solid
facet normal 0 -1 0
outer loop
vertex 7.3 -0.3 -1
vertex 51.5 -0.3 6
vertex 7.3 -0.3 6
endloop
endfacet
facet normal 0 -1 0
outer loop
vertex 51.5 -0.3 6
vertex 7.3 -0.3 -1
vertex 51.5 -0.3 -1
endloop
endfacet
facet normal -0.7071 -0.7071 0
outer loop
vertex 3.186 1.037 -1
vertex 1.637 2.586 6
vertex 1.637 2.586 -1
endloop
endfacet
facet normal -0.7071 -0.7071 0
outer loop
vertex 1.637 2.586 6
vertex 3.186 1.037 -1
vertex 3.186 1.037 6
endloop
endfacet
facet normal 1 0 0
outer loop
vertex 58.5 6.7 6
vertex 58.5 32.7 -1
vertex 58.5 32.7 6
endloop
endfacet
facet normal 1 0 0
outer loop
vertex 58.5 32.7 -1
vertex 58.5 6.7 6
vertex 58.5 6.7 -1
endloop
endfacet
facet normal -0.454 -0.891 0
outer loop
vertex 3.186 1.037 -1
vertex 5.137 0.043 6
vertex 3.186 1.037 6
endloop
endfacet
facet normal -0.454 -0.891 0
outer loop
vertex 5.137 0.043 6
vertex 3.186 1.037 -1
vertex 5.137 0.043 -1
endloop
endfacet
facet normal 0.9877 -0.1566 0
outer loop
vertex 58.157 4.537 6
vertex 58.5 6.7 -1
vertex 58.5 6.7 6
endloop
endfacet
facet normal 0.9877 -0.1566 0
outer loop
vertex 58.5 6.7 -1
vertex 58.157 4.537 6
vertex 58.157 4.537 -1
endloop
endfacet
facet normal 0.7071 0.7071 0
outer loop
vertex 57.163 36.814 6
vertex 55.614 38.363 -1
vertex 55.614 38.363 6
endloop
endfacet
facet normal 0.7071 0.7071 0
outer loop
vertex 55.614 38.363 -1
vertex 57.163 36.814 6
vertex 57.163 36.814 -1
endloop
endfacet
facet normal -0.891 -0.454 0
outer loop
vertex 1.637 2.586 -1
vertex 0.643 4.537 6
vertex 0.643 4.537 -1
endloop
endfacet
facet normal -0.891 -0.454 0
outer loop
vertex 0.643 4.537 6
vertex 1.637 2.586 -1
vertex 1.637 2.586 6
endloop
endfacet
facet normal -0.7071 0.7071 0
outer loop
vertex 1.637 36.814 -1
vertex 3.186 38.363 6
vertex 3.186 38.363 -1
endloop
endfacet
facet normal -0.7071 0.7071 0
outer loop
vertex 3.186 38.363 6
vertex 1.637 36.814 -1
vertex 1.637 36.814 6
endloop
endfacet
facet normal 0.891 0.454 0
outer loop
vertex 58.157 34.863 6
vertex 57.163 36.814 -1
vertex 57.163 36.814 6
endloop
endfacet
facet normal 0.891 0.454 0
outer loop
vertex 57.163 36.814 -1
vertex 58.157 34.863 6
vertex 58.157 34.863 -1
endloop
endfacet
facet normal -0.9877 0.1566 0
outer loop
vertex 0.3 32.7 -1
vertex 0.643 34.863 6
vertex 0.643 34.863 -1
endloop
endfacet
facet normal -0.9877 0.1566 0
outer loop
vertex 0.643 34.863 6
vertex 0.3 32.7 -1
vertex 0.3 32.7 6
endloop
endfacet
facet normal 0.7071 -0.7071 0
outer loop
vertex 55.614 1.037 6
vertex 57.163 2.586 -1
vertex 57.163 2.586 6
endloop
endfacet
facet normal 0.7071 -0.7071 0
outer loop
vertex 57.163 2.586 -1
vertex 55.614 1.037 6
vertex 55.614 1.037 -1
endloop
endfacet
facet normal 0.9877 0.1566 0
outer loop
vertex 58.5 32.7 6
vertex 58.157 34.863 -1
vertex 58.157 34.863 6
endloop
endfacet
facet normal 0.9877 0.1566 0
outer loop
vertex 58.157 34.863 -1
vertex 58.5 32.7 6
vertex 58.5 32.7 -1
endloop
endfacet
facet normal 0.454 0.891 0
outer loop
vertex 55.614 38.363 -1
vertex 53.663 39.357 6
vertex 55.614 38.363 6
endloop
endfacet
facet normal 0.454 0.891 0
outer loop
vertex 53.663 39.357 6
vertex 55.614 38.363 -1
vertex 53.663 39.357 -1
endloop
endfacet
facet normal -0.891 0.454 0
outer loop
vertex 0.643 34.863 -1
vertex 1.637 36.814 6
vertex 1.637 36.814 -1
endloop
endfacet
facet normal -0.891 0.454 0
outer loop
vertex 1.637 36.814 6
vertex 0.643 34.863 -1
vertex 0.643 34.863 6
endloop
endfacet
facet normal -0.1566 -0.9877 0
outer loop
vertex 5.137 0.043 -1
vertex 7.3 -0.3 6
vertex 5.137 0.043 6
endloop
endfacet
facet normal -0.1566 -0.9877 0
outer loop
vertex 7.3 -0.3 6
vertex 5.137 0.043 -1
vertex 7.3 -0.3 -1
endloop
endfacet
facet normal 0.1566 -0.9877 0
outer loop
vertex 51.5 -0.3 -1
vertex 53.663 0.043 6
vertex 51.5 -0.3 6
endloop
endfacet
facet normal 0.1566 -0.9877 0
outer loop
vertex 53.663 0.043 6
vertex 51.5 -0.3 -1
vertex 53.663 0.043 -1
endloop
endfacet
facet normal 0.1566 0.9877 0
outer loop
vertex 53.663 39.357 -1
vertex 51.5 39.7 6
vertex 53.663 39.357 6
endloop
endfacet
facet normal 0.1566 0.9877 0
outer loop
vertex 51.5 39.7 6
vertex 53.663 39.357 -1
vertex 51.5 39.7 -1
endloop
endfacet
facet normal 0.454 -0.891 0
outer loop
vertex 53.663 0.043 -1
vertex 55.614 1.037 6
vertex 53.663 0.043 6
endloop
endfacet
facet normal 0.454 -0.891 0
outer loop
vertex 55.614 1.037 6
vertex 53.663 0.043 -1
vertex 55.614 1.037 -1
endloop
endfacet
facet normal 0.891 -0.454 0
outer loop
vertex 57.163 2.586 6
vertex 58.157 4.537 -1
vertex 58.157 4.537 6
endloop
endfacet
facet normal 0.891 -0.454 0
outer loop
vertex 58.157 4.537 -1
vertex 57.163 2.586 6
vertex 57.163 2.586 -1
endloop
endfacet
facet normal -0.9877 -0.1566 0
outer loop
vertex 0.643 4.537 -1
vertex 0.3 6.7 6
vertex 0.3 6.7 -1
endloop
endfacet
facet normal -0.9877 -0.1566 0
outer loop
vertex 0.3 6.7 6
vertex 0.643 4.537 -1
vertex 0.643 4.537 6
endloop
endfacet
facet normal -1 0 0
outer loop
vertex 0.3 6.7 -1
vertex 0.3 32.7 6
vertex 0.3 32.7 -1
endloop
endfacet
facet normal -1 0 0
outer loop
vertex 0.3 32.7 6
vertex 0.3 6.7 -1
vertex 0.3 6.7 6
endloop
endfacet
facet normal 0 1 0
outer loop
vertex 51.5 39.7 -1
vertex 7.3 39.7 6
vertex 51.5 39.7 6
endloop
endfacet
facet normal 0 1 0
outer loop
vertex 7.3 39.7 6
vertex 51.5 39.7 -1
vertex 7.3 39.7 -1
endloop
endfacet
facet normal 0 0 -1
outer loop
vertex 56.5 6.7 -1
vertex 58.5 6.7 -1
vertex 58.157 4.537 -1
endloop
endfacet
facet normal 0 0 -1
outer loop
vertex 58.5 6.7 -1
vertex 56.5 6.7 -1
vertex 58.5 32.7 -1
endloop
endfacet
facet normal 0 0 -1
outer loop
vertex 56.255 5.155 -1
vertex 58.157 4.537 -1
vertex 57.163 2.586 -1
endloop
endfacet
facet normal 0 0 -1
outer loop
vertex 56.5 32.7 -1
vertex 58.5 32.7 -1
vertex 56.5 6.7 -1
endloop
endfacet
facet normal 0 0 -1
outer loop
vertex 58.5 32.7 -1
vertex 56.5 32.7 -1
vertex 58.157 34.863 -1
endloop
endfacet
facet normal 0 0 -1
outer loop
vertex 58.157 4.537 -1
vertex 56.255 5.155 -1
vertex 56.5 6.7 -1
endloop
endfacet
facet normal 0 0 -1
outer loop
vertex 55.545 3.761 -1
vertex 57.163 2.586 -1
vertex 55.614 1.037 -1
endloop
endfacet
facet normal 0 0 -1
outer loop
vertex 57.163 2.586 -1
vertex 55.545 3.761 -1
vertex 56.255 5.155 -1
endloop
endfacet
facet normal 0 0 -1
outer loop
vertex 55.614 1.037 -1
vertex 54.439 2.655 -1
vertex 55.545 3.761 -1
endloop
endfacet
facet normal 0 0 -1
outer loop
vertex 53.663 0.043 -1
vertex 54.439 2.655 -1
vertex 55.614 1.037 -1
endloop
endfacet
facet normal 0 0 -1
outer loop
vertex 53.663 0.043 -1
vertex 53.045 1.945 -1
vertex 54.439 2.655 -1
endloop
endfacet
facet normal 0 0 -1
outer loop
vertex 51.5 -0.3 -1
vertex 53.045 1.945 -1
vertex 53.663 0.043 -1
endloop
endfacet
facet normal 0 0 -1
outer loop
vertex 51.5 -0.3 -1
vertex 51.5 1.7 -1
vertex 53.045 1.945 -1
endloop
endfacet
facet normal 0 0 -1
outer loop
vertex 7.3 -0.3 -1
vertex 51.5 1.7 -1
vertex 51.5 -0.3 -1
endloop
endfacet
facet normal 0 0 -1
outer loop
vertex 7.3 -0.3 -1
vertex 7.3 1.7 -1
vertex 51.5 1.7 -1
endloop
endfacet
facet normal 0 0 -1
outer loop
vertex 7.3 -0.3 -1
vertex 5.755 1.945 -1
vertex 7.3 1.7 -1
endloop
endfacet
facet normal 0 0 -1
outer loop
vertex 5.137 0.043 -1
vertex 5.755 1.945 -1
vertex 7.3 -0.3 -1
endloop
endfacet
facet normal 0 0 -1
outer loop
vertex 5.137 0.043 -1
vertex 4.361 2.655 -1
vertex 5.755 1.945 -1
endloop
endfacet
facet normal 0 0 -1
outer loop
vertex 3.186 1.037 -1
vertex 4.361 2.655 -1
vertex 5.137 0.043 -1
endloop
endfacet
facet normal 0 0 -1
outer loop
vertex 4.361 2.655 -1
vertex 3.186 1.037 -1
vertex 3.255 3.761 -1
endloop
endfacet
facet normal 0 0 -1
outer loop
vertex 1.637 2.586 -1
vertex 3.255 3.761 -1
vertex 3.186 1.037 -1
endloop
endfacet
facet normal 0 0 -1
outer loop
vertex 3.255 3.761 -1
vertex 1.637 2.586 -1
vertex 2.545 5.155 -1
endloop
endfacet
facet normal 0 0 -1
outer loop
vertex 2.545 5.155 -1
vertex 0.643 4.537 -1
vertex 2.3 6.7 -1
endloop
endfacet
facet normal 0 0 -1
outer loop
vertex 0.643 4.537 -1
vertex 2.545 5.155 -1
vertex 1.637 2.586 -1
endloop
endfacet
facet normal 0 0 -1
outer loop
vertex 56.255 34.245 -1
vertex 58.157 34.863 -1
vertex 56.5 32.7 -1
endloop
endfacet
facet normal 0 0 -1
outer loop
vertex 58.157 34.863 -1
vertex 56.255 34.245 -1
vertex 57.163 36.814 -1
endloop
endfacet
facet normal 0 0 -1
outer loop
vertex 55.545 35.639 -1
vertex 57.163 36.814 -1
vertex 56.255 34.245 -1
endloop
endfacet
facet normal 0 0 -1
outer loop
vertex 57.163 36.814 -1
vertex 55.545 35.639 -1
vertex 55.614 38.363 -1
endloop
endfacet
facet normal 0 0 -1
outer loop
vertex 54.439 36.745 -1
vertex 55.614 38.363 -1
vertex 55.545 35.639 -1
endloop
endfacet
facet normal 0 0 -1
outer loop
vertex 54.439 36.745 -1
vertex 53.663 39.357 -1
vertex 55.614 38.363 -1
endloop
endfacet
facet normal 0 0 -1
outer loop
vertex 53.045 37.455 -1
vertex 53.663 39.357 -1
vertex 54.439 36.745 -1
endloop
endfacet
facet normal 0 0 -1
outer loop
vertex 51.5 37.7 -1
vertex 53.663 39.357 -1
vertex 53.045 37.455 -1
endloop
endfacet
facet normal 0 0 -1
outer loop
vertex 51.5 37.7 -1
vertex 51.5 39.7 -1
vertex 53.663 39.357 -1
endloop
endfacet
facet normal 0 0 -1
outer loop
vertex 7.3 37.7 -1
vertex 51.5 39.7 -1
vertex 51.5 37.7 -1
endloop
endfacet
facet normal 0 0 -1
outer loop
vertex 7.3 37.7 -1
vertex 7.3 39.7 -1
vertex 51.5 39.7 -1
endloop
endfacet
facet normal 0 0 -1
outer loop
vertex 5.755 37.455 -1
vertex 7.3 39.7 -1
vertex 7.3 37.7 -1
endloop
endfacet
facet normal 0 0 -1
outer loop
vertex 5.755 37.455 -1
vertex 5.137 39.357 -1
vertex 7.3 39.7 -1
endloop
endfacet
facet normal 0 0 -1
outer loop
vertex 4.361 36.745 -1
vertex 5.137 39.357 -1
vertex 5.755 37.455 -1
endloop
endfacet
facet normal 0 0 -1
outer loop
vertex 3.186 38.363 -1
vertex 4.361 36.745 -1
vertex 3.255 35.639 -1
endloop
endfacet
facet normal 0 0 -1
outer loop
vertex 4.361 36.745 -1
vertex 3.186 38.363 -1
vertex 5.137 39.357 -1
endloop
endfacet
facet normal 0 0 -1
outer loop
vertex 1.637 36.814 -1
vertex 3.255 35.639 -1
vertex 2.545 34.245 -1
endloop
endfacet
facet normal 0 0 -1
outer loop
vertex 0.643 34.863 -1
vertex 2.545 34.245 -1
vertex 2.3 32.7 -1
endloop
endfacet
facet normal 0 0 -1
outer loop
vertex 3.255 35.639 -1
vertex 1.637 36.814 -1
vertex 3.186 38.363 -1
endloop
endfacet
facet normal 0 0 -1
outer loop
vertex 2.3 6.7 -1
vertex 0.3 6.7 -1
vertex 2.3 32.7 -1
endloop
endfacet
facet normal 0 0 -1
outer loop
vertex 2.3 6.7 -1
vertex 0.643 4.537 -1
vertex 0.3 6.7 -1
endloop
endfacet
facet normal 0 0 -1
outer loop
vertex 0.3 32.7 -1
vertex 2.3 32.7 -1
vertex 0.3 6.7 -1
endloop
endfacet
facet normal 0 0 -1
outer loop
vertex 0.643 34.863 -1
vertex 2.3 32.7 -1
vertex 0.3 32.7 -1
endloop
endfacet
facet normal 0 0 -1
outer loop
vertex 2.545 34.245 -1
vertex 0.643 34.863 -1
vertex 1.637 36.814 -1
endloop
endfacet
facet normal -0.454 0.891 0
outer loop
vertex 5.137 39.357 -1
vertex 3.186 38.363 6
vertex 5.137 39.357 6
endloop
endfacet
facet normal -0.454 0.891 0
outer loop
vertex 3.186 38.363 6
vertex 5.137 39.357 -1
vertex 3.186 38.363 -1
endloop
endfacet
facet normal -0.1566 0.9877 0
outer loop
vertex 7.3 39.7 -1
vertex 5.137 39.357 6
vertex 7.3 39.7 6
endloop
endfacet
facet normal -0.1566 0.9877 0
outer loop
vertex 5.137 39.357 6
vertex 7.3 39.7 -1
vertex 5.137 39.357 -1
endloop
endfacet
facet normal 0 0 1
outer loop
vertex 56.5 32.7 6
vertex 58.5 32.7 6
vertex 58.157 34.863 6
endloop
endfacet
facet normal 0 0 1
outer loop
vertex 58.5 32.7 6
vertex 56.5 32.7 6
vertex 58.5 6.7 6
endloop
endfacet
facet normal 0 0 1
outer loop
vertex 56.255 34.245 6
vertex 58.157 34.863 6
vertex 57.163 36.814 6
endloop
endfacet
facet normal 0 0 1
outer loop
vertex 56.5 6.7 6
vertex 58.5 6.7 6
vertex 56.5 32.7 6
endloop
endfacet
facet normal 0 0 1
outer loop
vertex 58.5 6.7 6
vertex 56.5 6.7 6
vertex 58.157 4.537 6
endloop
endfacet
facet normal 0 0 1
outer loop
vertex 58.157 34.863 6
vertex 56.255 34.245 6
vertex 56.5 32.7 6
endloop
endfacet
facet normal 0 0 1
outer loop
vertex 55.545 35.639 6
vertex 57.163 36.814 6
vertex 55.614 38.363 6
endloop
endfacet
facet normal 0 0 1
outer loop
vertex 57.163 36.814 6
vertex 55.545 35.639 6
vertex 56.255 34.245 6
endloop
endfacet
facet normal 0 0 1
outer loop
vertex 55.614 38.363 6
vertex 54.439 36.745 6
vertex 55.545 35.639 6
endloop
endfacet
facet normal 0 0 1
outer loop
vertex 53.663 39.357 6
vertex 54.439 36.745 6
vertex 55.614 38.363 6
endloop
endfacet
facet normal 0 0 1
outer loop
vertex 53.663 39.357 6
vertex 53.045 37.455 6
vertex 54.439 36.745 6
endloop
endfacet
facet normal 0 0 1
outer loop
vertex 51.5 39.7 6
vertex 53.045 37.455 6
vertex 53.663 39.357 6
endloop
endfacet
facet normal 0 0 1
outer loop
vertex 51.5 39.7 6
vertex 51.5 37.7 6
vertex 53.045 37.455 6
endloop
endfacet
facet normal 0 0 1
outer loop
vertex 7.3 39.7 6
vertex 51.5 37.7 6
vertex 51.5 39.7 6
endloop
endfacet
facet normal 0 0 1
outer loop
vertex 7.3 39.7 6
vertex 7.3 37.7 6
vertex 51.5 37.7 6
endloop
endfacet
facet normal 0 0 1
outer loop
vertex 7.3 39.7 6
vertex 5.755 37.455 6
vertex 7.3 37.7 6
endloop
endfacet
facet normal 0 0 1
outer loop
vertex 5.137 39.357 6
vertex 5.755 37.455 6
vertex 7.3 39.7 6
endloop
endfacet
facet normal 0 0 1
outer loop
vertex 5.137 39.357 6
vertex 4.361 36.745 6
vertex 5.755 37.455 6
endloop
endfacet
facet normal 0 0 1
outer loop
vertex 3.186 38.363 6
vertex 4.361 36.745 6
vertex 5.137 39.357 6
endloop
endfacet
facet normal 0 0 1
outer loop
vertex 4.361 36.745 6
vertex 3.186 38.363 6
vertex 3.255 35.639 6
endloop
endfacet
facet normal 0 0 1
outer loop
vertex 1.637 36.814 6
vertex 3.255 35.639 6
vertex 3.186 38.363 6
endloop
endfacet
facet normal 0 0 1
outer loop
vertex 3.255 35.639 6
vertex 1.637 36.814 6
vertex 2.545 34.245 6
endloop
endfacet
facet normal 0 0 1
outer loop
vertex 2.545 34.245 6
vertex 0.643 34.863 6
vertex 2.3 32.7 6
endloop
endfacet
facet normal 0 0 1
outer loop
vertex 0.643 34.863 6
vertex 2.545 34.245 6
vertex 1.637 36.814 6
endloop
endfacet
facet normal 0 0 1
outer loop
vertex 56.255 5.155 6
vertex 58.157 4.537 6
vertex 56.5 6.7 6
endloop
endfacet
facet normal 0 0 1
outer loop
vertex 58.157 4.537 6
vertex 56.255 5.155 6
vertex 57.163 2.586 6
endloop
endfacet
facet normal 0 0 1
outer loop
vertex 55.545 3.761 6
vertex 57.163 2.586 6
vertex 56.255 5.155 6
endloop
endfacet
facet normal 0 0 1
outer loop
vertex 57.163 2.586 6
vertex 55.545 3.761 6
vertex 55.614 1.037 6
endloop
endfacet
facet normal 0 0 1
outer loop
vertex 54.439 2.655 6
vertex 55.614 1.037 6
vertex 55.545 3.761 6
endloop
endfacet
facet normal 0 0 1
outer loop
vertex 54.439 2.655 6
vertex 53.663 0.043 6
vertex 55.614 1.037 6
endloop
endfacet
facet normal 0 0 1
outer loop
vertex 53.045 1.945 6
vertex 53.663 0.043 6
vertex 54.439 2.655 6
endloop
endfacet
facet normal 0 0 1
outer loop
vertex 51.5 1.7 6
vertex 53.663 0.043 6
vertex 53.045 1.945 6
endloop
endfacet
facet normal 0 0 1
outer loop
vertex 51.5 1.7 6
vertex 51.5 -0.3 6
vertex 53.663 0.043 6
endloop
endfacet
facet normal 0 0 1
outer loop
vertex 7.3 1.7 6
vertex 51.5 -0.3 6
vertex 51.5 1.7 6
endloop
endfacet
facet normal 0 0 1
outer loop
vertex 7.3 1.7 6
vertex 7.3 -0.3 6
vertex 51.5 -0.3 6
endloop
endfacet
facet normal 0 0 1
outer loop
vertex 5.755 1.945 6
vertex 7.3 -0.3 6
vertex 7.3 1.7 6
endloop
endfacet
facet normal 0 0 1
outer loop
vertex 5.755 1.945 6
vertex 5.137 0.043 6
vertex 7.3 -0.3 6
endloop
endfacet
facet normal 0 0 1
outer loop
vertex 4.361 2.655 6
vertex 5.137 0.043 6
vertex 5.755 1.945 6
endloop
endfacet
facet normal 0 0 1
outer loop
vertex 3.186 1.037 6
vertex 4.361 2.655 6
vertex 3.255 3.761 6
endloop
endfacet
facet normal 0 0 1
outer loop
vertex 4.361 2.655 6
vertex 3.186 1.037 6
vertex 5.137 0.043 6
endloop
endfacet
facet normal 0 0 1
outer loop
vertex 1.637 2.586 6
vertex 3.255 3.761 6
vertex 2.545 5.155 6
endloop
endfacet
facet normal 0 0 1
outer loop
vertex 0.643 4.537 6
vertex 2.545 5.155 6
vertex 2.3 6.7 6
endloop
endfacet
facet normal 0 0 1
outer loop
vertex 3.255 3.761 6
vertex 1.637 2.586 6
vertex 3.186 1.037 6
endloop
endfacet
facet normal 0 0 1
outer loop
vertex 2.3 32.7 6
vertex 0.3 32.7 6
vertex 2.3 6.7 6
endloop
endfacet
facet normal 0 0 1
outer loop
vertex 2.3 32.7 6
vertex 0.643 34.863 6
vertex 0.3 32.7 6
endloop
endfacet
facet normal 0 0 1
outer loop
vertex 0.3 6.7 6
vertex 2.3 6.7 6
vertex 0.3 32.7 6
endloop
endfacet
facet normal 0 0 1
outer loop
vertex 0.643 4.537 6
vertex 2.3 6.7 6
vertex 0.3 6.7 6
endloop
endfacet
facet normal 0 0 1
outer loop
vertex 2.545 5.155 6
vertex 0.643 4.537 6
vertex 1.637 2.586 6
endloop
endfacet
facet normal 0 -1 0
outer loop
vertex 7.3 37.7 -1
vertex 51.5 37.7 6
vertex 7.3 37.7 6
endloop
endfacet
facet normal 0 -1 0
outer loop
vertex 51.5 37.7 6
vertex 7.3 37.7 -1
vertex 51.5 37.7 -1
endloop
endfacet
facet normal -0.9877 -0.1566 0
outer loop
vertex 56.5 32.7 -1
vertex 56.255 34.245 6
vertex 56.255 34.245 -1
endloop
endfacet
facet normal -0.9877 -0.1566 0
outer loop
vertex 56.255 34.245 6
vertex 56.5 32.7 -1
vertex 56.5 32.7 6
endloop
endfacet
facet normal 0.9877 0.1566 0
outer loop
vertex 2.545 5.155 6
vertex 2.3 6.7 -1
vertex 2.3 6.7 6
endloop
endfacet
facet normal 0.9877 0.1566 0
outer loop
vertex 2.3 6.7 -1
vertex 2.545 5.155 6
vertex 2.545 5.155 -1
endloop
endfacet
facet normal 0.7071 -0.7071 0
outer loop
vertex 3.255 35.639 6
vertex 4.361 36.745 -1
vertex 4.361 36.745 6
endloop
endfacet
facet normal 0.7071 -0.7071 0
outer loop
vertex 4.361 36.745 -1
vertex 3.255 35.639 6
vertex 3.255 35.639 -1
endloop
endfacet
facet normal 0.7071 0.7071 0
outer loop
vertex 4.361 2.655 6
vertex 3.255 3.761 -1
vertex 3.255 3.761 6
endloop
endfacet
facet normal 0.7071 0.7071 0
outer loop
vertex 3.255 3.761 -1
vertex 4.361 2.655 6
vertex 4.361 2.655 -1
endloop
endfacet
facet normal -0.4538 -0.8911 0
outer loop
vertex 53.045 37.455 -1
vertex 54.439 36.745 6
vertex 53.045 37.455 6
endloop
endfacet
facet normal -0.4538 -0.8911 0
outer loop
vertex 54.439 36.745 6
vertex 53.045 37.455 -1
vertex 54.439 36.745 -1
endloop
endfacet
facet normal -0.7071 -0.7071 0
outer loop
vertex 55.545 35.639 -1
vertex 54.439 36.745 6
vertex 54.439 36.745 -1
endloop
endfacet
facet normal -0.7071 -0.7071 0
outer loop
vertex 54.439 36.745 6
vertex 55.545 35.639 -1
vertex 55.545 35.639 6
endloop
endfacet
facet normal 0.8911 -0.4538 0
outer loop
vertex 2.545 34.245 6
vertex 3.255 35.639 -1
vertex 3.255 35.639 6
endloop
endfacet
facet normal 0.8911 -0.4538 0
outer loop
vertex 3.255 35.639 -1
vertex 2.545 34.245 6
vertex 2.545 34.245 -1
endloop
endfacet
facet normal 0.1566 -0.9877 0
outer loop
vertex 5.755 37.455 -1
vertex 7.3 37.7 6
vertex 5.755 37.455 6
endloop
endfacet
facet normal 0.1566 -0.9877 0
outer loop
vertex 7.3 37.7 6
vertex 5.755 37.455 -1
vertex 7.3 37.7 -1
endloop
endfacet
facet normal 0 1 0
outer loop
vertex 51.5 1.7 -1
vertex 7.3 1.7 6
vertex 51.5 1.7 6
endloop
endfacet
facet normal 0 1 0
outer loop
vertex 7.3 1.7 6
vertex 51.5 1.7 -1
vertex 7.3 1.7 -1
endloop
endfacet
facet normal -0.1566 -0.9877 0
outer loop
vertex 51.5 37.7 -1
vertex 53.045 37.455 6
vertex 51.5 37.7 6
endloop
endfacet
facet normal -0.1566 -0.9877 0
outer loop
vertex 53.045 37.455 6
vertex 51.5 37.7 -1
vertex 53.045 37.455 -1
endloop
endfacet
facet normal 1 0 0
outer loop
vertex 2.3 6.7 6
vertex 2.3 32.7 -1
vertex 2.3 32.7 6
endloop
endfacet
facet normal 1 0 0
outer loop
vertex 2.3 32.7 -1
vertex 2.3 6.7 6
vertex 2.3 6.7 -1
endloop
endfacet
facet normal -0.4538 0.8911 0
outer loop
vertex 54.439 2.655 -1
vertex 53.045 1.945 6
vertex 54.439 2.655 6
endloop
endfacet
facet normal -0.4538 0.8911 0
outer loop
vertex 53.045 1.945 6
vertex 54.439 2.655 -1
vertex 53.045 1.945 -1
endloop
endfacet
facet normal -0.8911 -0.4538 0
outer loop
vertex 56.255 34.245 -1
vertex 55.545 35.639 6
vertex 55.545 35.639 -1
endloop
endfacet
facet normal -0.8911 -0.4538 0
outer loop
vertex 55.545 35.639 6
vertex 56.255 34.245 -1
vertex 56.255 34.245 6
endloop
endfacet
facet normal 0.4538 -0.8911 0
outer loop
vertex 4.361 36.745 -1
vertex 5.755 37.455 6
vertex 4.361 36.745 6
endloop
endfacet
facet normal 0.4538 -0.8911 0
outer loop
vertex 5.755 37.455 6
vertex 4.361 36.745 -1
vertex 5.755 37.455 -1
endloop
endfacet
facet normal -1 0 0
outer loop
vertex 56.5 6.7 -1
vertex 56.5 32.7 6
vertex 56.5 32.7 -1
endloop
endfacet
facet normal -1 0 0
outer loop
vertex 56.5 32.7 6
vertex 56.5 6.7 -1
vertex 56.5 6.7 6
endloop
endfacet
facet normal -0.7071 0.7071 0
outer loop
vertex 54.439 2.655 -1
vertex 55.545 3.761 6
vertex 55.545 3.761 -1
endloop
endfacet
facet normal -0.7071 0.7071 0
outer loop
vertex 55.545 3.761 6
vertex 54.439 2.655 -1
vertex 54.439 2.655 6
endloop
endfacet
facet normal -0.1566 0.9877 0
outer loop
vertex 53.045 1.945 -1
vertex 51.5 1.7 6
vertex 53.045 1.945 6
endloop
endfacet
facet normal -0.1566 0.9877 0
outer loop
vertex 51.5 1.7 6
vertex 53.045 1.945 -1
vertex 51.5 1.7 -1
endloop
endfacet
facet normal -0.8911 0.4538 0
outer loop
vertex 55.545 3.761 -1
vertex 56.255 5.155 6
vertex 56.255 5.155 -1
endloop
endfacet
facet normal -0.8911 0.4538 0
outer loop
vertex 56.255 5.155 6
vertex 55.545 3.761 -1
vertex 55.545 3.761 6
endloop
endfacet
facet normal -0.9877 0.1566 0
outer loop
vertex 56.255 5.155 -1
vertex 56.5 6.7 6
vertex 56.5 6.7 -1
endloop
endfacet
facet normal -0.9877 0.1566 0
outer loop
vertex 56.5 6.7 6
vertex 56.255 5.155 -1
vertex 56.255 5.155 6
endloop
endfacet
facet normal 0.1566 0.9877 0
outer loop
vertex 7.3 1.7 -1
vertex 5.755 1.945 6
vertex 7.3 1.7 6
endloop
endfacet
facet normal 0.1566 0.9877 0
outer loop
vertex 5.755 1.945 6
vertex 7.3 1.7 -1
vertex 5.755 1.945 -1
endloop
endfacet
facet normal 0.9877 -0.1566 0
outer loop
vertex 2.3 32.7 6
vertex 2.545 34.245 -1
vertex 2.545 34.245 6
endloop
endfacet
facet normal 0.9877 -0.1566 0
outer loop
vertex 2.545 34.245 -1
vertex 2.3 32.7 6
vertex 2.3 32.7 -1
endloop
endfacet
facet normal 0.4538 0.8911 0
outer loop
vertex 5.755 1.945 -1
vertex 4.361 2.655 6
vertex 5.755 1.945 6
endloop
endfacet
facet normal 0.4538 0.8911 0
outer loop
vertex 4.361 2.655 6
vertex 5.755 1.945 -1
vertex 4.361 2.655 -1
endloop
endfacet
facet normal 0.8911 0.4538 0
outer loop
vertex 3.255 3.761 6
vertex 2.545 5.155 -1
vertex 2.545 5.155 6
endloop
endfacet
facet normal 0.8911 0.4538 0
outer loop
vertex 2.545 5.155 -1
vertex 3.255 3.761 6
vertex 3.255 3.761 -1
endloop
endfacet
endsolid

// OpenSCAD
/**
 * Martin Egli
 * 2021-09-22
 * chocolate bike
 */

res = 20;
module minkowskiBike(loc_res = 5) {
    minkowski()
    {
        scale([0.5, 0.5, 1])
        linear_extrude(0.01)
        import(file="bike1.dxf");
        // a bit complexer outline
        union() {
            translate([0, 0, 0])
            cylinder(r1 = 1.5, r2 = 1.2, h = 0.5, $fn = loc_res);
            translate([0, 0, 0.5])
            cylinder(r1 = 1.2, r2 = 0.5, h = 0.5, $fn = loc_res);
        }
    }
}

//minkowskiBike(6);

module bottomPlate(xyratio = 1) {
    translate([53, 5, 0])
    rotate([0, 180, 0])
    mirror([0, 0,  1])
    scale([xyratio, xyratio, 1])
    import(file = "chocBikev1.stl");
   
    rad1 = 5;
    difference() {
        minkowski() {
            translate([4.3-2+rad1, 3.7-2+rad1, -1])
            cube([50.2+4-2*rad1, 32+4-2*rad1, 1]);
            cylinder(r1 = rad1, r2 = rad1, h = 2, $fn = res);
        }
        minkowski() {
            translate([4.3-2+rad1, 3.7-2+rad1, 0])
            cube([50.2+4-2*rad1, 32+4-2*rad1, 1]);
            cylinder(r1 = 3, r2 = rad1, h = 2, $fn = res);
        }
    }
}

module case(xyratio = 1) {
    rad1 = 5;
    difference() {
        minkowski() {
            translate([4.3-2+rad1, 3.7-2+rad1, -1])
            cube([50.2+4-2*rad1, 32+4-2*rad1, 5]);
            cylinder(r1 = rad1+2, r2 = rad1+2, h = 2, $fn = res);
        }
        minkowski() {
            translate([4.3-2+rad1, 3.7-2+rad1, -1.5])
            cube([50.2+4-2*rad1, 32+4-2*rad1, 5+1]);
            cylinder(r1 = rad1, r2 = rad1, h = 2, $fn = res);
        }
    }
}
//bottomPlate(1);
case(1);
